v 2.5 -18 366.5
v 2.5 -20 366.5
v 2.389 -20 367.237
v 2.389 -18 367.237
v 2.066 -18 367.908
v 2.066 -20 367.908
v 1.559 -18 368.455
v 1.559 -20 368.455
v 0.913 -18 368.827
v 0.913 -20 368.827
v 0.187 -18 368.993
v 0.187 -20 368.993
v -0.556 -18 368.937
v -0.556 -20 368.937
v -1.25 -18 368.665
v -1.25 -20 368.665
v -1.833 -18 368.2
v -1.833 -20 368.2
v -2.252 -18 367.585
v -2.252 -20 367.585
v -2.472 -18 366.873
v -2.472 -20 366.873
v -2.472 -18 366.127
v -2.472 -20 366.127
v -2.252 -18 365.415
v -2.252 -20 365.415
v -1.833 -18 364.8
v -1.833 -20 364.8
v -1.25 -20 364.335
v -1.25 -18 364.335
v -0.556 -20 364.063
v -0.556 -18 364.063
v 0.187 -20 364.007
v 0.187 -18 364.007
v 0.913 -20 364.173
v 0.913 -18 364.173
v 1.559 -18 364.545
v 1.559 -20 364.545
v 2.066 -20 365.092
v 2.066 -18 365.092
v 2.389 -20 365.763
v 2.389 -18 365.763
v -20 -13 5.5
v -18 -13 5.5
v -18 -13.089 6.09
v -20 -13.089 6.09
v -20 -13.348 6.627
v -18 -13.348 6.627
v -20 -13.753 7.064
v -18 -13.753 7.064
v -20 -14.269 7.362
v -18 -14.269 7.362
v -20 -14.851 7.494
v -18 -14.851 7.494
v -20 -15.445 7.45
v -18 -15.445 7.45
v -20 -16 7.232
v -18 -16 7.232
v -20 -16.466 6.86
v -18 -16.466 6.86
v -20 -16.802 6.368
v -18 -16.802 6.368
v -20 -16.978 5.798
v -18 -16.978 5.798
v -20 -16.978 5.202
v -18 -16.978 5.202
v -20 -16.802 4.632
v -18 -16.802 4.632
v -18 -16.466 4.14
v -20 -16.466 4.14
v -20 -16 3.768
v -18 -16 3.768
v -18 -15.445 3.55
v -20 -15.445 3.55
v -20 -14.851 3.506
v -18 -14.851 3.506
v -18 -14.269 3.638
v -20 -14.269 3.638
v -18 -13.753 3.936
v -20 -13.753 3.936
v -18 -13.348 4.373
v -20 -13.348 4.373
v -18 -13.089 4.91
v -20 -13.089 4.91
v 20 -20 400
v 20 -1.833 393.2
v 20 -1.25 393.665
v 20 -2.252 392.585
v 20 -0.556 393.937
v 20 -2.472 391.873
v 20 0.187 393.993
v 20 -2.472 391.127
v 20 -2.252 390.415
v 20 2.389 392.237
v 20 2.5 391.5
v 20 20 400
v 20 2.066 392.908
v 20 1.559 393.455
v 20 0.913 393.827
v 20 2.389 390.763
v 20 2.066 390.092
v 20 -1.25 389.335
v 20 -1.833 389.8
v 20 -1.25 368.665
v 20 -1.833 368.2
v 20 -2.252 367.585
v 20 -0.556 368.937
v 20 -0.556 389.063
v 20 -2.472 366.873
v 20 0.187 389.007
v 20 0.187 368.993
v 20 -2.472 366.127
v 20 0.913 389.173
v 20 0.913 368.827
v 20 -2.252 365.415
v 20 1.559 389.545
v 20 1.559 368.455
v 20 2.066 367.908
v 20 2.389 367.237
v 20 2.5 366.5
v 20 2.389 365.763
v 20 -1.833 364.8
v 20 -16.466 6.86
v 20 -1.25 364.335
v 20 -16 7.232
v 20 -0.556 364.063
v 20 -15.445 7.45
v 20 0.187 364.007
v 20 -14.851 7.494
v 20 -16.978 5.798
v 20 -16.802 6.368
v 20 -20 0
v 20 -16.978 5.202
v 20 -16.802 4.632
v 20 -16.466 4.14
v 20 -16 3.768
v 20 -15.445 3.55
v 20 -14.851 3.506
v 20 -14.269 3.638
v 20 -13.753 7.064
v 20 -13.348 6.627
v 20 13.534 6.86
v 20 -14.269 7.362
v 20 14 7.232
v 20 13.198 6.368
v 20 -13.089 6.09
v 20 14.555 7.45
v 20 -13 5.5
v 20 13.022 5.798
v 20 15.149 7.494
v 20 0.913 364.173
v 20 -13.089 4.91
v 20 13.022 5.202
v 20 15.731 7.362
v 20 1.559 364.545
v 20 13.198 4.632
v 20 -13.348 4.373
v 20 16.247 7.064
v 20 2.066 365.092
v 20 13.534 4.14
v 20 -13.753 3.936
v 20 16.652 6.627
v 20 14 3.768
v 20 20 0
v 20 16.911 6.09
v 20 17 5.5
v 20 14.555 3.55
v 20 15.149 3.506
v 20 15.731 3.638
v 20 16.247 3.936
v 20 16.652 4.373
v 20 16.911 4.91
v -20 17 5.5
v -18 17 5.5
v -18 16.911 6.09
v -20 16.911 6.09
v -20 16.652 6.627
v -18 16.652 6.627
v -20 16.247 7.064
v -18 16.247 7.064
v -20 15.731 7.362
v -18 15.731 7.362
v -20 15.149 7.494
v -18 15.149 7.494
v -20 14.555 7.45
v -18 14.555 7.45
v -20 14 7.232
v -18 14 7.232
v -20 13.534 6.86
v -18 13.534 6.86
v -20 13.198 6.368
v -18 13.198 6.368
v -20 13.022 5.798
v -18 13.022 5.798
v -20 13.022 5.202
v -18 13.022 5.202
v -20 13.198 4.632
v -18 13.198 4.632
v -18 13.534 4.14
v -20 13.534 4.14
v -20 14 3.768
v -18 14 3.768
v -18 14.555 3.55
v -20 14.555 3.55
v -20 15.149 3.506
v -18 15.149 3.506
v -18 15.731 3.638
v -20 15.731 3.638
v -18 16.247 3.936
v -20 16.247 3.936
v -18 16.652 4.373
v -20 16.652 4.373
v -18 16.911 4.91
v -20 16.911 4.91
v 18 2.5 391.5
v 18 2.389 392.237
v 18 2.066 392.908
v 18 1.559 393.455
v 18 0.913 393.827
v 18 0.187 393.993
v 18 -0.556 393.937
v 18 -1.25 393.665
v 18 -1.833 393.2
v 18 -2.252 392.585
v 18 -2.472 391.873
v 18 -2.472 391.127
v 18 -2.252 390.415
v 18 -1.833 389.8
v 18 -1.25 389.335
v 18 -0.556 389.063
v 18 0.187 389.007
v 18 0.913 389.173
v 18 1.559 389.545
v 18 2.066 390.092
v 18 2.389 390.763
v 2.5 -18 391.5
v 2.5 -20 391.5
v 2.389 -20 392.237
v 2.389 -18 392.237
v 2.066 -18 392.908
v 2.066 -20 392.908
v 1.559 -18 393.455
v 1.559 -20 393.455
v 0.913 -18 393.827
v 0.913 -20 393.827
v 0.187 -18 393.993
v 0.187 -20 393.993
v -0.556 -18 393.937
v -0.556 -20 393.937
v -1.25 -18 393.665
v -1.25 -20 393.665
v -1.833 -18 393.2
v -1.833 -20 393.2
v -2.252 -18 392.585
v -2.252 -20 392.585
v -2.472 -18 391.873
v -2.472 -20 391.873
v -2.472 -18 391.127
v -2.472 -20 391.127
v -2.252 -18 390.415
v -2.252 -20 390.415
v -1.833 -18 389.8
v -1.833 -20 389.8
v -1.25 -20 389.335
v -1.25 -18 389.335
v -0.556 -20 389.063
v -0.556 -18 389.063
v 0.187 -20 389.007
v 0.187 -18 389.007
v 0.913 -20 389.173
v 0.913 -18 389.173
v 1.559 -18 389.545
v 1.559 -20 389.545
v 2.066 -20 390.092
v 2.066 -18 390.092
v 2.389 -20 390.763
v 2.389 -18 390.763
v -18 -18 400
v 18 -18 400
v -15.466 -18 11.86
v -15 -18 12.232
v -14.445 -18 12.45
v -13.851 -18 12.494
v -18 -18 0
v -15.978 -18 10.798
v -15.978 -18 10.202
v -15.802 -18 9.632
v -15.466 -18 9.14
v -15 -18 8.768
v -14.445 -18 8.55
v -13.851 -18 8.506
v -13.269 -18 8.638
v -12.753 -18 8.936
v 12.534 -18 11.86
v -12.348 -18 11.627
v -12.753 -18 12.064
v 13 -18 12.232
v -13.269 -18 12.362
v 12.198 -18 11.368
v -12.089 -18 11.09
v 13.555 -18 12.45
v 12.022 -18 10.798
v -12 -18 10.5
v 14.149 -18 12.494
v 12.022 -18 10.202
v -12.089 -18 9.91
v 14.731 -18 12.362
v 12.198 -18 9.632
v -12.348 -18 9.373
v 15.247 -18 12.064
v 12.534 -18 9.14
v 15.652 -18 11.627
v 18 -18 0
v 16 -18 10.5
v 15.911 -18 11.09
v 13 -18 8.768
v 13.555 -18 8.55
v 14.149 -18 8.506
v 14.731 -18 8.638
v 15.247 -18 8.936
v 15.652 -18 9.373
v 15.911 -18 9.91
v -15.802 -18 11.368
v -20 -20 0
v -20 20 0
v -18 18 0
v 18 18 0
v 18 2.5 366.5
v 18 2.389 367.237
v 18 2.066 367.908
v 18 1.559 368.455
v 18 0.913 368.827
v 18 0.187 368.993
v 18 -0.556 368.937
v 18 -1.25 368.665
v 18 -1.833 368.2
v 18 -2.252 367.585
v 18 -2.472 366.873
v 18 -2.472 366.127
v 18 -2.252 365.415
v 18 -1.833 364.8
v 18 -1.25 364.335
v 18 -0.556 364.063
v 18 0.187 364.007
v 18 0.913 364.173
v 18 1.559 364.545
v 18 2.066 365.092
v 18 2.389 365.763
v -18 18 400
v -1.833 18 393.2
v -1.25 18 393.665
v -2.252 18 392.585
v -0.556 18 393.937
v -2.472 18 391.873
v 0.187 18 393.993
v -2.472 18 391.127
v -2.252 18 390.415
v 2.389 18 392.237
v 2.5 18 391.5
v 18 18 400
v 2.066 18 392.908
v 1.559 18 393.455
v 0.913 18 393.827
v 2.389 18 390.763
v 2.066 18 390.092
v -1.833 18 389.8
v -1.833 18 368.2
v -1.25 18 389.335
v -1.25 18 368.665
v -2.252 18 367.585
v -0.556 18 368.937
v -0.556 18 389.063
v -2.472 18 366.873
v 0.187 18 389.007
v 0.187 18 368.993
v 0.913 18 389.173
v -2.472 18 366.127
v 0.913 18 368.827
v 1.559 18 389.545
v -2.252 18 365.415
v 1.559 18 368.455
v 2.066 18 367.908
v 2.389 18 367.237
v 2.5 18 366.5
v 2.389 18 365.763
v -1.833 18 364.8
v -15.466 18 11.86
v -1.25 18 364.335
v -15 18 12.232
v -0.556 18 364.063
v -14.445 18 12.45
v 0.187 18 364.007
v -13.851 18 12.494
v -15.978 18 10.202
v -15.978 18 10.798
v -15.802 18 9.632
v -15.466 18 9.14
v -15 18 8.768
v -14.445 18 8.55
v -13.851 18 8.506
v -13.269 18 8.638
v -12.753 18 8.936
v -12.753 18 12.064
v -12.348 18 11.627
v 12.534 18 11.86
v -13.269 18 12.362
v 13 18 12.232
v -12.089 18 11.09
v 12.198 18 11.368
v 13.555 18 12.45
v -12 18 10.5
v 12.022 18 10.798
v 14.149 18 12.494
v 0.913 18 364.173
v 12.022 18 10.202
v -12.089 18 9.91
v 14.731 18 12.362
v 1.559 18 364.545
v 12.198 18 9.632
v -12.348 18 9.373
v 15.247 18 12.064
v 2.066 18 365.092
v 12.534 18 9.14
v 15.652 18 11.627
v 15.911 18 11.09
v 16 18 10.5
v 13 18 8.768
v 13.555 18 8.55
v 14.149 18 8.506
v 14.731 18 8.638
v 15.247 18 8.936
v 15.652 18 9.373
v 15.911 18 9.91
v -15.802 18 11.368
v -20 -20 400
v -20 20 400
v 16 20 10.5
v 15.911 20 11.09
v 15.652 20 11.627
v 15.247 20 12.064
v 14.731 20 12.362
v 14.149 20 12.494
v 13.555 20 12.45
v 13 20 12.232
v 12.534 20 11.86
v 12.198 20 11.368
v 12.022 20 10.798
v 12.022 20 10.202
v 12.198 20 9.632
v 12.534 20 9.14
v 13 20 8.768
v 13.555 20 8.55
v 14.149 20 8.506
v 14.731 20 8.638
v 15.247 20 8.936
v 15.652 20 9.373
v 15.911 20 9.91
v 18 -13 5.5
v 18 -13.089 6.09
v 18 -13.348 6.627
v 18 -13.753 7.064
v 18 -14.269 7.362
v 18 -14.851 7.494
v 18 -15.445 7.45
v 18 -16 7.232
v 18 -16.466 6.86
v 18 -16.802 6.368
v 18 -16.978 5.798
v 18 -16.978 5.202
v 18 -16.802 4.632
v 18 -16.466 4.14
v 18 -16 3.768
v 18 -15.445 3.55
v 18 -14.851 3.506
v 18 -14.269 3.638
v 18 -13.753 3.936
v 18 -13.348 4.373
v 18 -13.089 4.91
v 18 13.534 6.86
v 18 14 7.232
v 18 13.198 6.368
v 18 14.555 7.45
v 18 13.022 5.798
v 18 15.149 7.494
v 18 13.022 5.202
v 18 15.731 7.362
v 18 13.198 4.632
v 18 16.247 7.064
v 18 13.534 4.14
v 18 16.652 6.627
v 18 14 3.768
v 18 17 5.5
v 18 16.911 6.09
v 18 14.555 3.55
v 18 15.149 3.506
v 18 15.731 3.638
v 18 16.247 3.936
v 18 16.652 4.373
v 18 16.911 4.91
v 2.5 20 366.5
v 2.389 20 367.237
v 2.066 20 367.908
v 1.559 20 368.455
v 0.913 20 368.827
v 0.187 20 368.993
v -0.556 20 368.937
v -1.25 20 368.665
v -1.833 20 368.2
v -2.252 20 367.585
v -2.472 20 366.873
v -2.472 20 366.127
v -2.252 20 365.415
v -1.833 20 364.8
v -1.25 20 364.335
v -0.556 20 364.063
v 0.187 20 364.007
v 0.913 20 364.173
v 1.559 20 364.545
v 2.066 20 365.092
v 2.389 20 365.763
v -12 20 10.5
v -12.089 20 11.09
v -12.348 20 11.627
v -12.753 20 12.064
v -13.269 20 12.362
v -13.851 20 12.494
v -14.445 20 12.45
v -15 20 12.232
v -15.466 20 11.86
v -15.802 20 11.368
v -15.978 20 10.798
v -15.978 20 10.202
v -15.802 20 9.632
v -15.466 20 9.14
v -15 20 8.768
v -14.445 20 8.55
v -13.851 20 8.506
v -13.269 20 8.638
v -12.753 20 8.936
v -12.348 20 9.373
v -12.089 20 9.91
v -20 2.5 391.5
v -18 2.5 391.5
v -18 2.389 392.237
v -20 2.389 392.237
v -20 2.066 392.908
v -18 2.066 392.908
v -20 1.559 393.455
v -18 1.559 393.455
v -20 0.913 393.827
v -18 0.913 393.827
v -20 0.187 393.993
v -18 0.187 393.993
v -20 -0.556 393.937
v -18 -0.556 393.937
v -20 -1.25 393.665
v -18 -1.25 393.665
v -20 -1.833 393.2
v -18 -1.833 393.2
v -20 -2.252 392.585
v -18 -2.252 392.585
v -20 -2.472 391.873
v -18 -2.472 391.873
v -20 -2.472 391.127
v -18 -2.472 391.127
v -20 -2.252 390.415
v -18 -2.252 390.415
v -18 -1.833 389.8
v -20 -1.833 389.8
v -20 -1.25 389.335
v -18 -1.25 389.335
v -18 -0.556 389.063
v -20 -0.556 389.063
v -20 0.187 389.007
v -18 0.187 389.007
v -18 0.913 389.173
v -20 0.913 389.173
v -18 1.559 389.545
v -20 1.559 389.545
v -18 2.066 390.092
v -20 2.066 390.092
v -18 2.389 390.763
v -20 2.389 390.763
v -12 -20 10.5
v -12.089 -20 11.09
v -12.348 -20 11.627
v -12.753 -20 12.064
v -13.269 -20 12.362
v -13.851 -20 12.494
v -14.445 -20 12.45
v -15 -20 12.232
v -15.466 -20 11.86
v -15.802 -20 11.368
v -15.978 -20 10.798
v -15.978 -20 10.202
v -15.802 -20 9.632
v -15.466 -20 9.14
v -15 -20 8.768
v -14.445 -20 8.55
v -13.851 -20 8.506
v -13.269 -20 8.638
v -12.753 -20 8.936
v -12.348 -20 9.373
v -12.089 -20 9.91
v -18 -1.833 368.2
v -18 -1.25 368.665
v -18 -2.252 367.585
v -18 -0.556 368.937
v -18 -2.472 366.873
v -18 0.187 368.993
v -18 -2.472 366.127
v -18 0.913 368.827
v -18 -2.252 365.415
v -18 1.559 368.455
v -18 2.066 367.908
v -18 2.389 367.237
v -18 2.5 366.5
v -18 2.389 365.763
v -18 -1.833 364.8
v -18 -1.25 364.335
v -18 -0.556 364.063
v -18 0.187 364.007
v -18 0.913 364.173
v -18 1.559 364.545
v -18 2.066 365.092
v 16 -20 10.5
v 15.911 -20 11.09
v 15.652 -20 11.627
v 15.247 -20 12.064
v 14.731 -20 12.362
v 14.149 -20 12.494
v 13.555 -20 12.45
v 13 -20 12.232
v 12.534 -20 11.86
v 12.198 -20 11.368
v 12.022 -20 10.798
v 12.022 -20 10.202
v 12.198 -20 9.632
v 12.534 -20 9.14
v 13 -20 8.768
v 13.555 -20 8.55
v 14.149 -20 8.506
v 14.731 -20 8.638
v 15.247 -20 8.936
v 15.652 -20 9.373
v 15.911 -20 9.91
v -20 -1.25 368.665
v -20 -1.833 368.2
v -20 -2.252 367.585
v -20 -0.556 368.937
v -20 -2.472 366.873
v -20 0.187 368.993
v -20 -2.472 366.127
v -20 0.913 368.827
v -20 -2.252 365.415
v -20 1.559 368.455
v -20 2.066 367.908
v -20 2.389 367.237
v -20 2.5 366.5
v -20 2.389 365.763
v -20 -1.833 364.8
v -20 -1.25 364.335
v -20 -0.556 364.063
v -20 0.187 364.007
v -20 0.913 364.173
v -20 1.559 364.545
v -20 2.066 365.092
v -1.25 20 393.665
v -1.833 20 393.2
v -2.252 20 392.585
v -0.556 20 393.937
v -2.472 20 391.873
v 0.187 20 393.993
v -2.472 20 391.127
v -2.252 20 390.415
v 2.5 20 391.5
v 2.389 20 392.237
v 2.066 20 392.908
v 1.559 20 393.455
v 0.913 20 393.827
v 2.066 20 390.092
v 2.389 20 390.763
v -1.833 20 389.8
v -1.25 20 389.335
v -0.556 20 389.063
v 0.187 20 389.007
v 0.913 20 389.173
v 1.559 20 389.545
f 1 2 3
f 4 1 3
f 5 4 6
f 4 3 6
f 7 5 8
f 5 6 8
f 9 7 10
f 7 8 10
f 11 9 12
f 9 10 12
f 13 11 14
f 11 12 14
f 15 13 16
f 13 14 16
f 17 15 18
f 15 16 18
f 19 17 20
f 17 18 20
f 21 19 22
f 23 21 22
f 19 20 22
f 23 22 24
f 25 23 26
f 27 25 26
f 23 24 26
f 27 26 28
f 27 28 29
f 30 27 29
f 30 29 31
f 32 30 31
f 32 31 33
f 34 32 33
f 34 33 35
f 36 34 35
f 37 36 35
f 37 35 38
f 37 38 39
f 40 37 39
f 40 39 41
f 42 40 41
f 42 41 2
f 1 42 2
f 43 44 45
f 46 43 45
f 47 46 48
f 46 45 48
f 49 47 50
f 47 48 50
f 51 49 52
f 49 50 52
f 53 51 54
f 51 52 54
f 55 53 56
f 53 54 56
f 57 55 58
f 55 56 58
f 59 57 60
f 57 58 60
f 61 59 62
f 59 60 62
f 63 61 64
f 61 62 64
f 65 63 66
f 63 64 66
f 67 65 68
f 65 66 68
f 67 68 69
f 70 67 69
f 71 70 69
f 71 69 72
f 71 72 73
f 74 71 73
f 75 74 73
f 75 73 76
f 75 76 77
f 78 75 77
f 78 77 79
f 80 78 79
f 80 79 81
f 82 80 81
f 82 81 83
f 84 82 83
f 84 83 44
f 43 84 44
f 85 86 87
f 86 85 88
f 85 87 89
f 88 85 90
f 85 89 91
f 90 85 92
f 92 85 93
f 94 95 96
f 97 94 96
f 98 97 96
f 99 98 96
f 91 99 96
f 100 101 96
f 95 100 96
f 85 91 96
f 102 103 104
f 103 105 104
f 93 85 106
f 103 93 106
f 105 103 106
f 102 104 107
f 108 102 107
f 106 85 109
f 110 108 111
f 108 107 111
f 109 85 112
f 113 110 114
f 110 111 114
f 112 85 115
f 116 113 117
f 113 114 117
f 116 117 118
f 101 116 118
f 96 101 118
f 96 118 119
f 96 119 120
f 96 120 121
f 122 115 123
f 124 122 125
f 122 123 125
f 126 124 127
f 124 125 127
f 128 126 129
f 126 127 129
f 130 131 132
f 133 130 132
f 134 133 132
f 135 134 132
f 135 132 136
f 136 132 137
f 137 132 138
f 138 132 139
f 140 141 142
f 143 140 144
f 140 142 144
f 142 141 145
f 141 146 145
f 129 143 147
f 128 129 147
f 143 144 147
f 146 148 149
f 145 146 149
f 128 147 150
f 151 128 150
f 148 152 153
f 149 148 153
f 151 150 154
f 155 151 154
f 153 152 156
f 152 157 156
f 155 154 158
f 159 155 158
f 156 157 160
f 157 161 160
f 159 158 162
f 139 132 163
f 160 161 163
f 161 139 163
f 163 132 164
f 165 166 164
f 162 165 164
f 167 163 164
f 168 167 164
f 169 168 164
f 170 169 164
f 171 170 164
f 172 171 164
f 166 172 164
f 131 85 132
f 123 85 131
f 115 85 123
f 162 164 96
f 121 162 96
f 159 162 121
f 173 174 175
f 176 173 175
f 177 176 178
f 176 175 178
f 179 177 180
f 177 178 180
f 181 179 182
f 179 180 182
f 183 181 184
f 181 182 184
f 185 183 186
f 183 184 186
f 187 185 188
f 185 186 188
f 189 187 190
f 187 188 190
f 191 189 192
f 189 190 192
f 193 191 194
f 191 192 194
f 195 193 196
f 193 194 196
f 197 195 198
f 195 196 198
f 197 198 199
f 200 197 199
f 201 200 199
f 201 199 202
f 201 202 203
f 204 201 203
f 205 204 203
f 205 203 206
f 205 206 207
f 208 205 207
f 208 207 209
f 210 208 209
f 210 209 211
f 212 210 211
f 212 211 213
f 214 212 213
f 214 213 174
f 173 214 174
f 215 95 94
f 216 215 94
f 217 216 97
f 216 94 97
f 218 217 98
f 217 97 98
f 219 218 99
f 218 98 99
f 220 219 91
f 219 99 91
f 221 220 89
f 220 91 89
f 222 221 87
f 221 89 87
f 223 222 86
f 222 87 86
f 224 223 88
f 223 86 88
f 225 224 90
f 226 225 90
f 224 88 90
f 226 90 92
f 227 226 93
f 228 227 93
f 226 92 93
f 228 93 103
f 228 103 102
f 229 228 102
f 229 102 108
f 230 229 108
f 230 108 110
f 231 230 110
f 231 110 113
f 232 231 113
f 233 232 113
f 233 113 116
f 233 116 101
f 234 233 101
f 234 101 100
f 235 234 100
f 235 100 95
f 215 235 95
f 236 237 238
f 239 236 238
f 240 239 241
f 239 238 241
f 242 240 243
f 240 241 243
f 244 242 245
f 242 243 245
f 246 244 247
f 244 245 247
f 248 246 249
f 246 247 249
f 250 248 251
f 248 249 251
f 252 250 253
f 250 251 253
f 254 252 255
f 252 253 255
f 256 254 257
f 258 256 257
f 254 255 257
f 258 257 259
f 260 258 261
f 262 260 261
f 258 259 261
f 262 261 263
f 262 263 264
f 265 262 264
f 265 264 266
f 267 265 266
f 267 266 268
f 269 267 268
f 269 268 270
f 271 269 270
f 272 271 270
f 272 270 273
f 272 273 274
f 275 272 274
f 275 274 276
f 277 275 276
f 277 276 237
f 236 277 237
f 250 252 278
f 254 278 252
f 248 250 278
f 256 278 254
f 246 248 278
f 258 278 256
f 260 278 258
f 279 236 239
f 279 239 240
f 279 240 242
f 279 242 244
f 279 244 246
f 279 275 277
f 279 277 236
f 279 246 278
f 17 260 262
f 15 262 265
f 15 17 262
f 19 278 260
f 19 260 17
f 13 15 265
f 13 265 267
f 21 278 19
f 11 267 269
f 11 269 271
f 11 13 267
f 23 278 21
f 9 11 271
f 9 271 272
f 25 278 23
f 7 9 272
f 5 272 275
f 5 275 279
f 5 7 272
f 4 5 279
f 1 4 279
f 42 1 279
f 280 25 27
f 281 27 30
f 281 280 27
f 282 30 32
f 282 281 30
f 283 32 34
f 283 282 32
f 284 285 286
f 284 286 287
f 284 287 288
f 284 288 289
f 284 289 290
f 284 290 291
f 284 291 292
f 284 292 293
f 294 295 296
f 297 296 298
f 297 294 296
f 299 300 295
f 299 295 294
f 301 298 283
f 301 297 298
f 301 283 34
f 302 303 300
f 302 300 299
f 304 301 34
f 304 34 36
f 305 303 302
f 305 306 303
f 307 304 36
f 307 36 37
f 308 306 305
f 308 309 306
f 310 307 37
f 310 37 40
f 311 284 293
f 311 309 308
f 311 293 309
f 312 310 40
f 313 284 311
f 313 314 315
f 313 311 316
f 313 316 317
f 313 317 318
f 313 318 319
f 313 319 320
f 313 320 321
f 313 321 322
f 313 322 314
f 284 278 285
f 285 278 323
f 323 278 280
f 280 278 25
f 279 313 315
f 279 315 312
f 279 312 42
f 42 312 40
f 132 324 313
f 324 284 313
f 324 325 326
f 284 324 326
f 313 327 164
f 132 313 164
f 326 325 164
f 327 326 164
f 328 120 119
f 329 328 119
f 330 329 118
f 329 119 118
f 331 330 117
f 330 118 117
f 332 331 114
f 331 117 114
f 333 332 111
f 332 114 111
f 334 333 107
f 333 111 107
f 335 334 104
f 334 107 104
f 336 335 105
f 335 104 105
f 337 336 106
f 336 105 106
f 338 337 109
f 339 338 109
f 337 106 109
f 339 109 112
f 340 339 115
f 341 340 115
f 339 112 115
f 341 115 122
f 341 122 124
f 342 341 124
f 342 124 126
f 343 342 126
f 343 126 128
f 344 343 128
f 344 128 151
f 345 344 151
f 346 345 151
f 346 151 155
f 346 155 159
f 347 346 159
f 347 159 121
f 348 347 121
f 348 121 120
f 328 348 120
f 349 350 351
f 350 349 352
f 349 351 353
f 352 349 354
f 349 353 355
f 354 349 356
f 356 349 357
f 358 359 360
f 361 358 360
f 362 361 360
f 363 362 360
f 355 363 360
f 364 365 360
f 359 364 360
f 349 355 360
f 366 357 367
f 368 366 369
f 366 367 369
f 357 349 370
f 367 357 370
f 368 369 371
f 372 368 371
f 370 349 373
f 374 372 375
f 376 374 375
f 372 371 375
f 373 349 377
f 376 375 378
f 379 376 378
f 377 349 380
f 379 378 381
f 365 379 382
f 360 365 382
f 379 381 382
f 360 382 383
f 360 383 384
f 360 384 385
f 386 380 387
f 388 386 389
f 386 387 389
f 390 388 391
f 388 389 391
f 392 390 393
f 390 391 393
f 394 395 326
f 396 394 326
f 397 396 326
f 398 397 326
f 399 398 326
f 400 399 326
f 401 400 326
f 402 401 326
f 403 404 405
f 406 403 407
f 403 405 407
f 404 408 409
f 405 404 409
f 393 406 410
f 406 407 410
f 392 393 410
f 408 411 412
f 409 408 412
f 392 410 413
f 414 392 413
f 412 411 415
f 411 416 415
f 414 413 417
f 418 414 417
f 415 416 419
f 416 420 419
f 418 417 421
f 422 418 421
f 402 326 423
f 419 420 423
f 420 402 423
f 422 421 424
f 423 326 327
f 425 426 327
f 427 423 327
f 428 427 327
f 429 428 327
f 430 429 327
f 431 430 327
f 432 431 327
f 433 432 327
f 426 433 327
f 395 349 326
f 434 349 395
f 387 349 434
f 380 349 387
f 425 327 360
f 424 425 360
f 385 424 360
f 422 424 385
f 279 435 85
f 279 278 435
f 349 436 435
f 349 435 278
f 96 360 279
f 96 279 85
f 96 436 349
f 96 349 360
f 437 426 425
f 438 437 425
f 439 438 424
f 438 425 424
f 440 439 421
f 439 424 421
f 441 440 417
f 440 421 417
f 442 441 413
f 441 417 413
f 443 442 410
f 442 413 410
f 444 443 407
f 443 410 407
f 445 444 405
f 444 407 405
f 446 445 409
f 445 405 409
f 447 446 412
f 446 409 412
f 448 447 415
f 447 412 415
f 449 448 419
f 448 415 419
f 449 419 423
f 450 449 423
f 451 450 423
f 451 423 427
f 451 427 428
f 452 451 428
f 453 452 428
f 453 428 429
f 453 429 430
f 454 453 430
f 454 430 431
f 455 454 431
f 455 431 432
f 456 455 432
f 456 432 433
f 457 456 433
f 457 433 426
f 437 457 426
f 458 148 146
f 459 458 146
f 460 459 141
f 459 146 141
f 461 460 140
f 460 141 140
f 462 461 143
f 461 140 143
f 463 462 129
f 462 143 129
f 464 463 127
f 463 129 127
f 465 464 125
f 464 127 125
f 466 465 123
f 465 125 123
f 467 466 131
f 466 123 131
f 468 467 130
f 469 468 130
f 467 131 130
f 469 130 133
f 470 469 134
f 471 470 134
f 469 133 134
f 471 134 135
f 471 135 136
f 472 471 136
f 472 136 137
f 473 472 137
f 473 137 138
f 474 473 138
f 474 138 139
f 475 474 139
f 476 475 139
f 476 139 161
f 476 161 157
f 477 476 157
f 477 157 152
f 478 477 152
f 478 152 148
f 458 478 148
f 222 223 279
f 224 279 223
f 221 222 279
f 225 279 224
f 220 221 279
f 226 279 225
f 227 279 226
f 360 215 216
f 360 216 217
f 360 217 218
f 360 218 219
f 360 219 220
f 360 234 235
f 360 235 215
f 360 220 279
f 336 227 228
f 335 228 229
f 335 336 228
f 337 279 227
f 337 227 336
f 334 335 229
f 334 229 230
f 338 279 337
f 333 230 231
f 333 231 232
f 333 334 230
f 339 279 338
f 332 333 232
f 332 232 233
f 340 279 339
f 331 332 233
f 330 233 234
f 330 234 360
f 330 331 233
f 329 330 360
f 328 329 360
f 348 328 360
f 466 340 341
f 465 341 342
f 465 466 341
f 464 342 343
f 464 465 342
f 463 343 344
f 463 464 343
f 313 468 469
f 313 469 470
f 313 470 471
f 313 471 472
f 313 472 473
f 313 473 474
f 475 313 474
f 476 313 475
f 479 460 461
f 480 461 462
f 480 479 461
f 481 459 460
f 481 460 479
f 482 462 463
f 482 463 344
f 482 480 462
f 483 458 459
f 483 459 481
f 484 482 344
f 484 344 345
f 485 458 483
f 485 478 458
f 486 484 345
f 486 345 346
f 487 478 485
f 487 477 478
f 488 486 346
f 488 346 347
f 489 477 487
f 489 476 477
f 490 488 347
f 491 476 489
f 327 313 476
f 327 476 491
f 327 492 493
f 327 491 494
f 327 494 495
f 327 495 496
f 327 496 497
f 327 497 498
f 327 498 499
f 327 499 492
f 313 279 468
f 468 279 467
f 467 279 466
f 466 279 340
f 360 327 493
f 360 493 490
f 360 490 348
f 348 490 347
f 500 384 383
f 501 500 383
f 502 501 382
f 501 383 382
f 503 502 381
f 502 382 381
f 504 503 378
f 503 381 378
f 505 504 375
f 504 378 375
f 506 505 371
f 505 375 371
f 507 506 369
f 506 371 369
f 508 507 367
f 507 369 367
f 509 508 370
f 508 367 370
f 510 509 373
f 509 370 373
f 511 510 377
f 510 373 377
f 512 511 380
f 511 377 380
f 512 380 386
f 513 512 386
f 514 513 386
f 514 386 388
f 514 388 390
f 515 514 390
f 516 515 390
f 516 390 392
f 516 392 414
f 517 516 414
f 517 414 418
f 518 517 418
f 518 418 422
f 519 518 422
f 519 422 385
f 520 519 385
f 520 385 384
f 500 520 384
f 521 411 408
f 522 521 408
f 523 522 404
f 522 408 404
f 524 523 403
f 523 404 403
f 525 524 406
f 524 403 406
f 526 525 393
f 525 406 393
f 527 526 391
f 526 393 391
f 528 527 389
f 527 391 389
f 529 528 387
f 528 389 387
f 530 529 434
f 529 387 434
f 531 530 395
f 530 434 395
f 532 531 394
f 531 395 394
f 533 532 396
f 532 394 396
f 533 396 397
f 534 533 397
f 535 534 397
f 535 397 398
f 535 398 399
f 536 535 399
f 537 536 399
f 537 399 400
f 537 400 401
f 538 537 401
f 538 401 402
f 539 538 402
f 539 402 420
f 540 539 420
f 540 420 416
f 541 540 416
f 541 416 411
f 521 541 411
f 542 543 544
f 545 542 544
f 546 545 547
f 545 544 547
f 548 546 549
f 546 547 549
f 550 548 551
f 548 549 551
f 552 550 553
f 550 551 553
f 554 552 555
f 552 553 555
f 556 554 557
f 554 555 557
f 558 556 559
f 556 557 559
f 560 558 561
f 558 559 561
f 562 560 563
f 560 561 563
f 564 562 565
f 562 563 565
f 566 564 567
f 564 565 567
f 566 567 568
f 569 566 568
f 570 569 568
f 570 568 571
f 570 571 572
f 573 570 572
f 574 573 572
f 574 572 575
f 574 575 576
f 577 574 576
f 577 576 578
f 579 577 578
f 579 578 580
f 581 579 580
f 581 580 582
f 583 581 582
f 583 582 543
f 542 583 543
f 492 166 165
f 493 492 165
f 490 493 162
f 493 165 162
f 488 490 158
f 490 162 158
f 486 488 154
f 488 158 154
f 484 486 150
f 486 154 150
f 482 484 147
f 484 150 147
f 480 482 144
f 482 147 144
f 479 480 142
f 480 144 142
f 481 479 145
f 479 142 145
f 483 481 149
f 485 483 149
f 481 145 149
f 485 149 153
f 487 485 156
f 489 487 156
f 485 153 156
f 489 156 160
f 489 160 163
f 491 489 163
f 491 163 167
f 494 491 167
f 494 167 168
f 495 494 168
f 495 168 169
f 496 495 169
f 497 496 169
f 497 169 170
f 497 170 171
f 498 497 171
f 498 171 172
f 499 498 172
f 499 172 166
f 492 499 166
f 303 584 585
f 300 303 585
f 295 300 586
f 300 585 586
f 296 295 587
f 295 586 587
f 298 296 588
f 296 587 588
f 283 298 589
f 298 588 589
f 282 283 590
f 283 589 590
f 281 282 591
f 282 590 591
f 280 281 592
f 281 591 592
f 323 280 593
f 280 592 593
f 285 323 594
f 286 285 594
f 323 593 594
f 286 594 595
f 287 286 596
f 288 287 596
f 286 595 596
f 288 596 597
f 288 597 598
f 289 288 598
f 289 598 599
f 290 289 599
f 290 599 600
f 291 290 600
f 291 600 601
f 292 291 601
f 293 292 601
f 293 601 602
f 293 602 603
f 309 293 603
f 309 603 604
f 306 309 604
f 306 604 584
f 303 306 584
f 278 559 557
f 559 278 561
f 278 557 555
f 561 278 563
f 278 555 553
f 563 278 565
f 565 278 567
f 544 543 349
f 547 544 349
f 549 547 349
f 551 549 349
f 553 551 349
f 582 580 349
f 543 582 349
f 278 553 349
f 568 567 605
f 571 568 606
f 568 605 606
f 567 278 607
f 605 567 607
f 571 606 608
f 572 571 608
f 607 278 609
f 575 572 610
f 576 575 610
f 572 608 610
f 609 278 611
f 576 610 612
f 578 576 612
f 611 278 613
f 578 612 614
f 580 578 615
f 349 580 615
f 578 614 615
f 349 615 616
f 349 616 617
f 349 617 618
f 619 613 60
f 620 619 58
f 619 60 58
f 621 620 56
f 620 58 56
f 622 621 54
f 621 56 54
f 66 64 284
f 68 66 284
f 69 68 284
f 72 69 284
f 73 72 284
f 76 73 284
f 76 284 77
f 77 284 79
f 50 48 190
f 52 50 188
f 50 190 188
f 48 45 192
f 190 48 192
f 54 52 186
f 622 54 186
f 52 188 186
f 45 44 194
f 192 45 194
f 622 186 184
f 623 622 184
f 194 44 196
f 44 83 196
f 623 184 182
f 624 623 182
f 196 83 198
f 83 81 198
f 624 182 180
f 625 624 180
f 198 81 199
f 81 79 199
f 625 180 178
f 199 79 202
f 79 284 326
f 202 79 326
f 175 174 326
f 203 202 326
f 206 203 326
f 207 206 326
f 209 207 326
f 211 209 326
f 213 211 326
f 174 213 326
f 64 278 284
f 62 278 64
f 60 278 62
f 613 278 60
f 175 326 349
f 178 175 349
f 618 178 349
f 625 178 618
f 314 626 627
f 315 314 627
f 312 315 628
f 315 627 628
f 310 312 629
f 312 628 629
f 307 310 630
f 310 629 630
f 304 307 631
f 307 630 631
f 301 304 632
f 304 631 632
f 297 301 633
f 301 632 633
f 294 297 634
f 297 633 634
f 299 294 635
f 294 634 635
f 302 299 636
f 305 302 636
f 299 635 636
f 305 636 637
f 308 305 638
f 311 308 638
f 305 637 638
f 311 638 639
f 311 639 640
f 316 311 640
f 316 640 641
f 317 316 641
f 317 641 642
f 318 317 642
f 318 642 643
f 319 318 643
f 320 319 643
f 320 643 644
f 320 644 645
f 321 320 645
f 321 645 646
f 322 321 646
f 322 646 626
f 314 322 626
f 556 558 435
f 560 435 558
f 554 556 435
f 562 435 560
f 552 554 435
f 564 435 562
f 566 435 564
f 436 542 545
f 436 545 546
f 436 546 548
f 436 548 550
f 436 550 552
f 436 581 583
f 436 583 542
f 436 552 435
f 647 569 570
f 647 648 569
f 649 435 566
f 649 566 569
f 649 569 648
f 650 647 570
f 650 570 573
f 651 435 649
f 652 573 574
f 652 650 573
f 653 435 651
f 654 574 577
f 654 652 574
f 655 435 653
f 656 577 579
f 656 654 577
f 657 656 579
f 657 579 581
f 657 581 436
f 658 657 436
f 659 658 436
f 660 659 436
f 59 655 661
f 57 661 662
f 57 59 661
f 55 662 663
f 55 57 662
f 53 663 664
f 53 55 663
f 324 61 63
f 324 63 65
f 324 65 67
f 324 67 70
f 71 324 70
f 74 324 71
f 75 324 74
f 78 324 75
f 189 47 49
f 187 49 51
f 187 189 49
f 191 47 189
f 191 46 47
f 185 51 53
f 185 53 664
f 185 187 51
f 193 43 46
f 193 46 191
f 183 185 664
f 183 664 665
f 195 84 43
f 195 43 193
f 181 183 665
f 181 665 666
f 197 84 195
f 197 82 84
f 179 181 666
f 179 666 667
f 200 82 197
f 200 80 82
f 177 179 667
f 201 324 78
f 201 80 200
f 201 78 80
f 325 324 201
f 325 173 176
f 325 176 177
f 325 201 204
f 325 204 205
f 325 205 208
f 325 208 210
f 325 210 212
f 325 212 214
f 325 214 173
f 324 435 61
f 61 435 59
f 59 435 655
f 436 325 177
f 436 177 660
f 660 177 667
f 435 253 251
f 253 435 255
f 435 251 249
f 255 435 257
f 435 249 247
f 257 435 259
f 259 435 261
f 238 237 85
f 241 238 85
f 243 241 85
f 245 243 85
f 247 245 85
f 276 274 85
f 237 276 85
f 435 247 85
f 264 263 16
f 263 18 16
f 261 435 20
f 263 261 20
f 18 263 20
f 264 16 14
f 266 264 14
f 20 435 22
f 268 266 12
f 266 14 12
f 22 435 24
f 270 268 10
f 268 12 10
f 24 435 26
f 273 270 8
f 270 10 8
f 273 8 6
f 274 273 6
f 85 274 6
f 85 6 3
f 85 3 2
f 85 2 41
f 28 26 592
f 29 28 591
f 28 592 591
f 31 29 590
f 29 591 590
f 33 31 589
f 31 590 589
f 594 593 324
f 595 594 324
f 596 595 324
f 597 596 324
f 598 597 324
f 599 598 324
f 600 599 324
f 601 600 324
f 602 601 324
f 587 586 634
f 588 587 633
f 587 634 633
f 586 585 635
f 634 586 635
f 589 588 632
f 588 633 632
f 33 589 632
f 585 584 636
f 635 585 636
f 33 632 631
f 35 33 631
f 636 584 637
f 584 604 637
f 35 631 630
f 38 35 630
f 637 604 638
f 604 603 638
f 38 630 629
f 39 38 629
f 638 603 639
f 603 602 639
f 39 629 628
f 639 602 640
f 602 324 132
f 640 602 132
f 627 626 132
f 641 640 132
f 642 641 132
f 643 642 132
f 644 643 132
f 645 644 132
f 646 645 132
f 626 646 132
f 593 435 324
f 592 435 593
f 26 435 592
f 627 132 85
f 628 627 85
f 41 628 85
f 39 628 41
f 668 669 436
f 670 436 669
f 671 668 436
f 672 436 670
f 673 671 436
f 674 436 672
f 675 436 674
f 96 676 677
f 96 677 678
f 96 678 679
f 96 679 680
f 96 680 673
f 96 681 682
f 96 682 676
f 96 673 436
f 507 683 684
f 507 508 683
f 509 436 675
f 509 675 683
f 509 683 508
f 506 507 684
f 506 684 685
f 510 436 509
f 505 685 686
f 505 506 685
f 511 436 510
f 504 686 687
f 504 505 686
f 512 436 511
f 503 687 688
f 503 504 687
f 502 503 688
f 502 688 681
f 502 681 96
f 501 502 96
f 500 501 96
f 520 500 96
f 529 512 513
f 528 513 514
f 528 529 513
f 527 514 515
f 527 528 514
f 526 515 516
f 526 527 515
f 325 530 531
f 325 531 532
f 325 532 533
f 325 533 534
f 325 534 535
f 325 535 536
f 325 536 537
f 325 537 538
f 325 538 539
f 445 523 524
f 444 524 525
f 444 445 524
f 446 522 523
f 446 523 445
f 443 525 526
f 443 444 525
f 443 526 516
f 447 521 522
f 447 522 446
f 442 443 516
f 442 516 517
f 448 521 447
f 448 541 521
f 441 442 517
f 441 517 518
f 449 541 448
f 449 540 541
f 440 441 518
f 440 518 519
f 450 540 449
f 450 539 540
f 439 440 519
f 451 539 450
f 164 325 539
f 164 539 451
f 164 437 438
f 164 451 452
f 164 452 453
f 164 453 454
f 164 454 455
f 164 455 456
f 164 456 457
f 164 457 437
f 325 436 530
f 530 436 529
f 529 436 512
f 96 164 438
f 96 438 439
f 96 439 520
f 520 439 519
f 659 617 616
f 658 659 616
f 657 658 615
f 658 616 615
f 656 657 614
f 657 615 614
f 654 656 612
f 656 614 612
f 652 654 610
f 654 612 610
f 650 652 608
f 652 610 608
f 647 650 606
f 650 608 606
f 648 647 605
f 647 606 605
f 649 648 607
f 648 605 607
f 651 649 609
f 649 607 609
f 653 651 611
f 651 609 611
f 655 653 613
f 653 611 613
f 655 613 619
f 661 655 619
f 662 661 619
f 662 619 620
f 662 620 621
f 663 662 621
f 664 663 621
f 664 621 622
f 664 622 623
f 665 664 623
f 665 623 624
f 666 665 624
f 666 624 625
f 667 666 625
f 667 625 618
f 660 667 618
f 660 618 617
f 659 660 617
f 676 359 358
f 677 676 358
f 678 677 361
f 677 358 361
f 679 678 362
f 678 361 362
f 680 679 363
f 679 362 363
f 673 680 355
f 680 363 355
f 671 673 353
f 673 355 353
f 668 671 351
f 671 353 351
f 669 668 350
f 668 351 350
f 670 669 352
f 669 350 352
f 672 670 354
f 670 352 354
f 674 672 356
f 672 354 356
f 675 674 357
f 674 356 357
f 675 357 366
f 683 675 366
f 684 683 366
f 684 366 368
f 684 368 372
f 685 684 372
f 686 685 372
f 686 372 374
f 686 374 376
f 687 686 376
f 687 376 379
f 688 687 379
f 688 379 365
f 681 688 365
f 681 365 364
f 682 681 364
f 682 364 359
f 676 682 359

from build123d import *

# Parameters (mm, degrees)
F0_W     = 40
F0_H     = 40
F0_W_2   = 36
F0_H_2   = 36
F1_DEPTH = 400
F2_R     = 2
F3_DEPTH = 40
F4_R     = 2
F5_DEPTH = 40
F6_R     = 2.5
F7_DEPTH = 40
F8_R     = 2.5
F9_DEPTH = 40


with BuildPart() as f1:
    # F0 (on Top) → F1 (new body)
    with BuildSketch(Plane.XY):
        Rectangle(F0_W, F0_H)
        Rectangle(F0_W_2, F0_H_2, mode=Mode.SUBTRACT)
    extrude(amount=F1_DEPTH)

    # F2 (on face) → F3 (cut)
    with BuildSketch(Plane.YZ.offset(20)):
        with Locations((-15, 5.5)):
            Circle(F2_R)
        with Locations((15, 5.5)):
            Circle(F2_R)
    extrude(amount=-F3_DEPTH, mode=Mode.SUBTRACT)

    # F4 (on face) → F5 (cut)
    with BuildSketch(Plane.XZ.offset(20)):
        with Locations((-14, 10.5)):
            Circle(F4_R)
        with Locations((14, 10.5)):
            Circle(F4_R)
    extrude(amount=-F5_DEPTH, mode=Mode.SUBTRACT)

    # F6 (on face) → F7 (cut)
    with BuildSketch(Plane.YZ.offset(20)):
        with Locations((0, 391.5)):
            Circle(F6_R)
        with Locations((0, 366.5)):
            Circle(F6_R)
    extrude(amount=-F7_DEPTH, mode=Mode.SUBTRACT)

    # F8 (on face) → F9 (cut)
    with BuildSketch(Plane.XZ.offset(20)):
        with Locations((0, 391.5)):
            Circle(F8_R)
        with Locations((0, 366.5)):
            Circle(F8_R)
    extrude(amount=-F9_DEPTH, mode=Mode.SUBTRACT)


solid = f1.part
